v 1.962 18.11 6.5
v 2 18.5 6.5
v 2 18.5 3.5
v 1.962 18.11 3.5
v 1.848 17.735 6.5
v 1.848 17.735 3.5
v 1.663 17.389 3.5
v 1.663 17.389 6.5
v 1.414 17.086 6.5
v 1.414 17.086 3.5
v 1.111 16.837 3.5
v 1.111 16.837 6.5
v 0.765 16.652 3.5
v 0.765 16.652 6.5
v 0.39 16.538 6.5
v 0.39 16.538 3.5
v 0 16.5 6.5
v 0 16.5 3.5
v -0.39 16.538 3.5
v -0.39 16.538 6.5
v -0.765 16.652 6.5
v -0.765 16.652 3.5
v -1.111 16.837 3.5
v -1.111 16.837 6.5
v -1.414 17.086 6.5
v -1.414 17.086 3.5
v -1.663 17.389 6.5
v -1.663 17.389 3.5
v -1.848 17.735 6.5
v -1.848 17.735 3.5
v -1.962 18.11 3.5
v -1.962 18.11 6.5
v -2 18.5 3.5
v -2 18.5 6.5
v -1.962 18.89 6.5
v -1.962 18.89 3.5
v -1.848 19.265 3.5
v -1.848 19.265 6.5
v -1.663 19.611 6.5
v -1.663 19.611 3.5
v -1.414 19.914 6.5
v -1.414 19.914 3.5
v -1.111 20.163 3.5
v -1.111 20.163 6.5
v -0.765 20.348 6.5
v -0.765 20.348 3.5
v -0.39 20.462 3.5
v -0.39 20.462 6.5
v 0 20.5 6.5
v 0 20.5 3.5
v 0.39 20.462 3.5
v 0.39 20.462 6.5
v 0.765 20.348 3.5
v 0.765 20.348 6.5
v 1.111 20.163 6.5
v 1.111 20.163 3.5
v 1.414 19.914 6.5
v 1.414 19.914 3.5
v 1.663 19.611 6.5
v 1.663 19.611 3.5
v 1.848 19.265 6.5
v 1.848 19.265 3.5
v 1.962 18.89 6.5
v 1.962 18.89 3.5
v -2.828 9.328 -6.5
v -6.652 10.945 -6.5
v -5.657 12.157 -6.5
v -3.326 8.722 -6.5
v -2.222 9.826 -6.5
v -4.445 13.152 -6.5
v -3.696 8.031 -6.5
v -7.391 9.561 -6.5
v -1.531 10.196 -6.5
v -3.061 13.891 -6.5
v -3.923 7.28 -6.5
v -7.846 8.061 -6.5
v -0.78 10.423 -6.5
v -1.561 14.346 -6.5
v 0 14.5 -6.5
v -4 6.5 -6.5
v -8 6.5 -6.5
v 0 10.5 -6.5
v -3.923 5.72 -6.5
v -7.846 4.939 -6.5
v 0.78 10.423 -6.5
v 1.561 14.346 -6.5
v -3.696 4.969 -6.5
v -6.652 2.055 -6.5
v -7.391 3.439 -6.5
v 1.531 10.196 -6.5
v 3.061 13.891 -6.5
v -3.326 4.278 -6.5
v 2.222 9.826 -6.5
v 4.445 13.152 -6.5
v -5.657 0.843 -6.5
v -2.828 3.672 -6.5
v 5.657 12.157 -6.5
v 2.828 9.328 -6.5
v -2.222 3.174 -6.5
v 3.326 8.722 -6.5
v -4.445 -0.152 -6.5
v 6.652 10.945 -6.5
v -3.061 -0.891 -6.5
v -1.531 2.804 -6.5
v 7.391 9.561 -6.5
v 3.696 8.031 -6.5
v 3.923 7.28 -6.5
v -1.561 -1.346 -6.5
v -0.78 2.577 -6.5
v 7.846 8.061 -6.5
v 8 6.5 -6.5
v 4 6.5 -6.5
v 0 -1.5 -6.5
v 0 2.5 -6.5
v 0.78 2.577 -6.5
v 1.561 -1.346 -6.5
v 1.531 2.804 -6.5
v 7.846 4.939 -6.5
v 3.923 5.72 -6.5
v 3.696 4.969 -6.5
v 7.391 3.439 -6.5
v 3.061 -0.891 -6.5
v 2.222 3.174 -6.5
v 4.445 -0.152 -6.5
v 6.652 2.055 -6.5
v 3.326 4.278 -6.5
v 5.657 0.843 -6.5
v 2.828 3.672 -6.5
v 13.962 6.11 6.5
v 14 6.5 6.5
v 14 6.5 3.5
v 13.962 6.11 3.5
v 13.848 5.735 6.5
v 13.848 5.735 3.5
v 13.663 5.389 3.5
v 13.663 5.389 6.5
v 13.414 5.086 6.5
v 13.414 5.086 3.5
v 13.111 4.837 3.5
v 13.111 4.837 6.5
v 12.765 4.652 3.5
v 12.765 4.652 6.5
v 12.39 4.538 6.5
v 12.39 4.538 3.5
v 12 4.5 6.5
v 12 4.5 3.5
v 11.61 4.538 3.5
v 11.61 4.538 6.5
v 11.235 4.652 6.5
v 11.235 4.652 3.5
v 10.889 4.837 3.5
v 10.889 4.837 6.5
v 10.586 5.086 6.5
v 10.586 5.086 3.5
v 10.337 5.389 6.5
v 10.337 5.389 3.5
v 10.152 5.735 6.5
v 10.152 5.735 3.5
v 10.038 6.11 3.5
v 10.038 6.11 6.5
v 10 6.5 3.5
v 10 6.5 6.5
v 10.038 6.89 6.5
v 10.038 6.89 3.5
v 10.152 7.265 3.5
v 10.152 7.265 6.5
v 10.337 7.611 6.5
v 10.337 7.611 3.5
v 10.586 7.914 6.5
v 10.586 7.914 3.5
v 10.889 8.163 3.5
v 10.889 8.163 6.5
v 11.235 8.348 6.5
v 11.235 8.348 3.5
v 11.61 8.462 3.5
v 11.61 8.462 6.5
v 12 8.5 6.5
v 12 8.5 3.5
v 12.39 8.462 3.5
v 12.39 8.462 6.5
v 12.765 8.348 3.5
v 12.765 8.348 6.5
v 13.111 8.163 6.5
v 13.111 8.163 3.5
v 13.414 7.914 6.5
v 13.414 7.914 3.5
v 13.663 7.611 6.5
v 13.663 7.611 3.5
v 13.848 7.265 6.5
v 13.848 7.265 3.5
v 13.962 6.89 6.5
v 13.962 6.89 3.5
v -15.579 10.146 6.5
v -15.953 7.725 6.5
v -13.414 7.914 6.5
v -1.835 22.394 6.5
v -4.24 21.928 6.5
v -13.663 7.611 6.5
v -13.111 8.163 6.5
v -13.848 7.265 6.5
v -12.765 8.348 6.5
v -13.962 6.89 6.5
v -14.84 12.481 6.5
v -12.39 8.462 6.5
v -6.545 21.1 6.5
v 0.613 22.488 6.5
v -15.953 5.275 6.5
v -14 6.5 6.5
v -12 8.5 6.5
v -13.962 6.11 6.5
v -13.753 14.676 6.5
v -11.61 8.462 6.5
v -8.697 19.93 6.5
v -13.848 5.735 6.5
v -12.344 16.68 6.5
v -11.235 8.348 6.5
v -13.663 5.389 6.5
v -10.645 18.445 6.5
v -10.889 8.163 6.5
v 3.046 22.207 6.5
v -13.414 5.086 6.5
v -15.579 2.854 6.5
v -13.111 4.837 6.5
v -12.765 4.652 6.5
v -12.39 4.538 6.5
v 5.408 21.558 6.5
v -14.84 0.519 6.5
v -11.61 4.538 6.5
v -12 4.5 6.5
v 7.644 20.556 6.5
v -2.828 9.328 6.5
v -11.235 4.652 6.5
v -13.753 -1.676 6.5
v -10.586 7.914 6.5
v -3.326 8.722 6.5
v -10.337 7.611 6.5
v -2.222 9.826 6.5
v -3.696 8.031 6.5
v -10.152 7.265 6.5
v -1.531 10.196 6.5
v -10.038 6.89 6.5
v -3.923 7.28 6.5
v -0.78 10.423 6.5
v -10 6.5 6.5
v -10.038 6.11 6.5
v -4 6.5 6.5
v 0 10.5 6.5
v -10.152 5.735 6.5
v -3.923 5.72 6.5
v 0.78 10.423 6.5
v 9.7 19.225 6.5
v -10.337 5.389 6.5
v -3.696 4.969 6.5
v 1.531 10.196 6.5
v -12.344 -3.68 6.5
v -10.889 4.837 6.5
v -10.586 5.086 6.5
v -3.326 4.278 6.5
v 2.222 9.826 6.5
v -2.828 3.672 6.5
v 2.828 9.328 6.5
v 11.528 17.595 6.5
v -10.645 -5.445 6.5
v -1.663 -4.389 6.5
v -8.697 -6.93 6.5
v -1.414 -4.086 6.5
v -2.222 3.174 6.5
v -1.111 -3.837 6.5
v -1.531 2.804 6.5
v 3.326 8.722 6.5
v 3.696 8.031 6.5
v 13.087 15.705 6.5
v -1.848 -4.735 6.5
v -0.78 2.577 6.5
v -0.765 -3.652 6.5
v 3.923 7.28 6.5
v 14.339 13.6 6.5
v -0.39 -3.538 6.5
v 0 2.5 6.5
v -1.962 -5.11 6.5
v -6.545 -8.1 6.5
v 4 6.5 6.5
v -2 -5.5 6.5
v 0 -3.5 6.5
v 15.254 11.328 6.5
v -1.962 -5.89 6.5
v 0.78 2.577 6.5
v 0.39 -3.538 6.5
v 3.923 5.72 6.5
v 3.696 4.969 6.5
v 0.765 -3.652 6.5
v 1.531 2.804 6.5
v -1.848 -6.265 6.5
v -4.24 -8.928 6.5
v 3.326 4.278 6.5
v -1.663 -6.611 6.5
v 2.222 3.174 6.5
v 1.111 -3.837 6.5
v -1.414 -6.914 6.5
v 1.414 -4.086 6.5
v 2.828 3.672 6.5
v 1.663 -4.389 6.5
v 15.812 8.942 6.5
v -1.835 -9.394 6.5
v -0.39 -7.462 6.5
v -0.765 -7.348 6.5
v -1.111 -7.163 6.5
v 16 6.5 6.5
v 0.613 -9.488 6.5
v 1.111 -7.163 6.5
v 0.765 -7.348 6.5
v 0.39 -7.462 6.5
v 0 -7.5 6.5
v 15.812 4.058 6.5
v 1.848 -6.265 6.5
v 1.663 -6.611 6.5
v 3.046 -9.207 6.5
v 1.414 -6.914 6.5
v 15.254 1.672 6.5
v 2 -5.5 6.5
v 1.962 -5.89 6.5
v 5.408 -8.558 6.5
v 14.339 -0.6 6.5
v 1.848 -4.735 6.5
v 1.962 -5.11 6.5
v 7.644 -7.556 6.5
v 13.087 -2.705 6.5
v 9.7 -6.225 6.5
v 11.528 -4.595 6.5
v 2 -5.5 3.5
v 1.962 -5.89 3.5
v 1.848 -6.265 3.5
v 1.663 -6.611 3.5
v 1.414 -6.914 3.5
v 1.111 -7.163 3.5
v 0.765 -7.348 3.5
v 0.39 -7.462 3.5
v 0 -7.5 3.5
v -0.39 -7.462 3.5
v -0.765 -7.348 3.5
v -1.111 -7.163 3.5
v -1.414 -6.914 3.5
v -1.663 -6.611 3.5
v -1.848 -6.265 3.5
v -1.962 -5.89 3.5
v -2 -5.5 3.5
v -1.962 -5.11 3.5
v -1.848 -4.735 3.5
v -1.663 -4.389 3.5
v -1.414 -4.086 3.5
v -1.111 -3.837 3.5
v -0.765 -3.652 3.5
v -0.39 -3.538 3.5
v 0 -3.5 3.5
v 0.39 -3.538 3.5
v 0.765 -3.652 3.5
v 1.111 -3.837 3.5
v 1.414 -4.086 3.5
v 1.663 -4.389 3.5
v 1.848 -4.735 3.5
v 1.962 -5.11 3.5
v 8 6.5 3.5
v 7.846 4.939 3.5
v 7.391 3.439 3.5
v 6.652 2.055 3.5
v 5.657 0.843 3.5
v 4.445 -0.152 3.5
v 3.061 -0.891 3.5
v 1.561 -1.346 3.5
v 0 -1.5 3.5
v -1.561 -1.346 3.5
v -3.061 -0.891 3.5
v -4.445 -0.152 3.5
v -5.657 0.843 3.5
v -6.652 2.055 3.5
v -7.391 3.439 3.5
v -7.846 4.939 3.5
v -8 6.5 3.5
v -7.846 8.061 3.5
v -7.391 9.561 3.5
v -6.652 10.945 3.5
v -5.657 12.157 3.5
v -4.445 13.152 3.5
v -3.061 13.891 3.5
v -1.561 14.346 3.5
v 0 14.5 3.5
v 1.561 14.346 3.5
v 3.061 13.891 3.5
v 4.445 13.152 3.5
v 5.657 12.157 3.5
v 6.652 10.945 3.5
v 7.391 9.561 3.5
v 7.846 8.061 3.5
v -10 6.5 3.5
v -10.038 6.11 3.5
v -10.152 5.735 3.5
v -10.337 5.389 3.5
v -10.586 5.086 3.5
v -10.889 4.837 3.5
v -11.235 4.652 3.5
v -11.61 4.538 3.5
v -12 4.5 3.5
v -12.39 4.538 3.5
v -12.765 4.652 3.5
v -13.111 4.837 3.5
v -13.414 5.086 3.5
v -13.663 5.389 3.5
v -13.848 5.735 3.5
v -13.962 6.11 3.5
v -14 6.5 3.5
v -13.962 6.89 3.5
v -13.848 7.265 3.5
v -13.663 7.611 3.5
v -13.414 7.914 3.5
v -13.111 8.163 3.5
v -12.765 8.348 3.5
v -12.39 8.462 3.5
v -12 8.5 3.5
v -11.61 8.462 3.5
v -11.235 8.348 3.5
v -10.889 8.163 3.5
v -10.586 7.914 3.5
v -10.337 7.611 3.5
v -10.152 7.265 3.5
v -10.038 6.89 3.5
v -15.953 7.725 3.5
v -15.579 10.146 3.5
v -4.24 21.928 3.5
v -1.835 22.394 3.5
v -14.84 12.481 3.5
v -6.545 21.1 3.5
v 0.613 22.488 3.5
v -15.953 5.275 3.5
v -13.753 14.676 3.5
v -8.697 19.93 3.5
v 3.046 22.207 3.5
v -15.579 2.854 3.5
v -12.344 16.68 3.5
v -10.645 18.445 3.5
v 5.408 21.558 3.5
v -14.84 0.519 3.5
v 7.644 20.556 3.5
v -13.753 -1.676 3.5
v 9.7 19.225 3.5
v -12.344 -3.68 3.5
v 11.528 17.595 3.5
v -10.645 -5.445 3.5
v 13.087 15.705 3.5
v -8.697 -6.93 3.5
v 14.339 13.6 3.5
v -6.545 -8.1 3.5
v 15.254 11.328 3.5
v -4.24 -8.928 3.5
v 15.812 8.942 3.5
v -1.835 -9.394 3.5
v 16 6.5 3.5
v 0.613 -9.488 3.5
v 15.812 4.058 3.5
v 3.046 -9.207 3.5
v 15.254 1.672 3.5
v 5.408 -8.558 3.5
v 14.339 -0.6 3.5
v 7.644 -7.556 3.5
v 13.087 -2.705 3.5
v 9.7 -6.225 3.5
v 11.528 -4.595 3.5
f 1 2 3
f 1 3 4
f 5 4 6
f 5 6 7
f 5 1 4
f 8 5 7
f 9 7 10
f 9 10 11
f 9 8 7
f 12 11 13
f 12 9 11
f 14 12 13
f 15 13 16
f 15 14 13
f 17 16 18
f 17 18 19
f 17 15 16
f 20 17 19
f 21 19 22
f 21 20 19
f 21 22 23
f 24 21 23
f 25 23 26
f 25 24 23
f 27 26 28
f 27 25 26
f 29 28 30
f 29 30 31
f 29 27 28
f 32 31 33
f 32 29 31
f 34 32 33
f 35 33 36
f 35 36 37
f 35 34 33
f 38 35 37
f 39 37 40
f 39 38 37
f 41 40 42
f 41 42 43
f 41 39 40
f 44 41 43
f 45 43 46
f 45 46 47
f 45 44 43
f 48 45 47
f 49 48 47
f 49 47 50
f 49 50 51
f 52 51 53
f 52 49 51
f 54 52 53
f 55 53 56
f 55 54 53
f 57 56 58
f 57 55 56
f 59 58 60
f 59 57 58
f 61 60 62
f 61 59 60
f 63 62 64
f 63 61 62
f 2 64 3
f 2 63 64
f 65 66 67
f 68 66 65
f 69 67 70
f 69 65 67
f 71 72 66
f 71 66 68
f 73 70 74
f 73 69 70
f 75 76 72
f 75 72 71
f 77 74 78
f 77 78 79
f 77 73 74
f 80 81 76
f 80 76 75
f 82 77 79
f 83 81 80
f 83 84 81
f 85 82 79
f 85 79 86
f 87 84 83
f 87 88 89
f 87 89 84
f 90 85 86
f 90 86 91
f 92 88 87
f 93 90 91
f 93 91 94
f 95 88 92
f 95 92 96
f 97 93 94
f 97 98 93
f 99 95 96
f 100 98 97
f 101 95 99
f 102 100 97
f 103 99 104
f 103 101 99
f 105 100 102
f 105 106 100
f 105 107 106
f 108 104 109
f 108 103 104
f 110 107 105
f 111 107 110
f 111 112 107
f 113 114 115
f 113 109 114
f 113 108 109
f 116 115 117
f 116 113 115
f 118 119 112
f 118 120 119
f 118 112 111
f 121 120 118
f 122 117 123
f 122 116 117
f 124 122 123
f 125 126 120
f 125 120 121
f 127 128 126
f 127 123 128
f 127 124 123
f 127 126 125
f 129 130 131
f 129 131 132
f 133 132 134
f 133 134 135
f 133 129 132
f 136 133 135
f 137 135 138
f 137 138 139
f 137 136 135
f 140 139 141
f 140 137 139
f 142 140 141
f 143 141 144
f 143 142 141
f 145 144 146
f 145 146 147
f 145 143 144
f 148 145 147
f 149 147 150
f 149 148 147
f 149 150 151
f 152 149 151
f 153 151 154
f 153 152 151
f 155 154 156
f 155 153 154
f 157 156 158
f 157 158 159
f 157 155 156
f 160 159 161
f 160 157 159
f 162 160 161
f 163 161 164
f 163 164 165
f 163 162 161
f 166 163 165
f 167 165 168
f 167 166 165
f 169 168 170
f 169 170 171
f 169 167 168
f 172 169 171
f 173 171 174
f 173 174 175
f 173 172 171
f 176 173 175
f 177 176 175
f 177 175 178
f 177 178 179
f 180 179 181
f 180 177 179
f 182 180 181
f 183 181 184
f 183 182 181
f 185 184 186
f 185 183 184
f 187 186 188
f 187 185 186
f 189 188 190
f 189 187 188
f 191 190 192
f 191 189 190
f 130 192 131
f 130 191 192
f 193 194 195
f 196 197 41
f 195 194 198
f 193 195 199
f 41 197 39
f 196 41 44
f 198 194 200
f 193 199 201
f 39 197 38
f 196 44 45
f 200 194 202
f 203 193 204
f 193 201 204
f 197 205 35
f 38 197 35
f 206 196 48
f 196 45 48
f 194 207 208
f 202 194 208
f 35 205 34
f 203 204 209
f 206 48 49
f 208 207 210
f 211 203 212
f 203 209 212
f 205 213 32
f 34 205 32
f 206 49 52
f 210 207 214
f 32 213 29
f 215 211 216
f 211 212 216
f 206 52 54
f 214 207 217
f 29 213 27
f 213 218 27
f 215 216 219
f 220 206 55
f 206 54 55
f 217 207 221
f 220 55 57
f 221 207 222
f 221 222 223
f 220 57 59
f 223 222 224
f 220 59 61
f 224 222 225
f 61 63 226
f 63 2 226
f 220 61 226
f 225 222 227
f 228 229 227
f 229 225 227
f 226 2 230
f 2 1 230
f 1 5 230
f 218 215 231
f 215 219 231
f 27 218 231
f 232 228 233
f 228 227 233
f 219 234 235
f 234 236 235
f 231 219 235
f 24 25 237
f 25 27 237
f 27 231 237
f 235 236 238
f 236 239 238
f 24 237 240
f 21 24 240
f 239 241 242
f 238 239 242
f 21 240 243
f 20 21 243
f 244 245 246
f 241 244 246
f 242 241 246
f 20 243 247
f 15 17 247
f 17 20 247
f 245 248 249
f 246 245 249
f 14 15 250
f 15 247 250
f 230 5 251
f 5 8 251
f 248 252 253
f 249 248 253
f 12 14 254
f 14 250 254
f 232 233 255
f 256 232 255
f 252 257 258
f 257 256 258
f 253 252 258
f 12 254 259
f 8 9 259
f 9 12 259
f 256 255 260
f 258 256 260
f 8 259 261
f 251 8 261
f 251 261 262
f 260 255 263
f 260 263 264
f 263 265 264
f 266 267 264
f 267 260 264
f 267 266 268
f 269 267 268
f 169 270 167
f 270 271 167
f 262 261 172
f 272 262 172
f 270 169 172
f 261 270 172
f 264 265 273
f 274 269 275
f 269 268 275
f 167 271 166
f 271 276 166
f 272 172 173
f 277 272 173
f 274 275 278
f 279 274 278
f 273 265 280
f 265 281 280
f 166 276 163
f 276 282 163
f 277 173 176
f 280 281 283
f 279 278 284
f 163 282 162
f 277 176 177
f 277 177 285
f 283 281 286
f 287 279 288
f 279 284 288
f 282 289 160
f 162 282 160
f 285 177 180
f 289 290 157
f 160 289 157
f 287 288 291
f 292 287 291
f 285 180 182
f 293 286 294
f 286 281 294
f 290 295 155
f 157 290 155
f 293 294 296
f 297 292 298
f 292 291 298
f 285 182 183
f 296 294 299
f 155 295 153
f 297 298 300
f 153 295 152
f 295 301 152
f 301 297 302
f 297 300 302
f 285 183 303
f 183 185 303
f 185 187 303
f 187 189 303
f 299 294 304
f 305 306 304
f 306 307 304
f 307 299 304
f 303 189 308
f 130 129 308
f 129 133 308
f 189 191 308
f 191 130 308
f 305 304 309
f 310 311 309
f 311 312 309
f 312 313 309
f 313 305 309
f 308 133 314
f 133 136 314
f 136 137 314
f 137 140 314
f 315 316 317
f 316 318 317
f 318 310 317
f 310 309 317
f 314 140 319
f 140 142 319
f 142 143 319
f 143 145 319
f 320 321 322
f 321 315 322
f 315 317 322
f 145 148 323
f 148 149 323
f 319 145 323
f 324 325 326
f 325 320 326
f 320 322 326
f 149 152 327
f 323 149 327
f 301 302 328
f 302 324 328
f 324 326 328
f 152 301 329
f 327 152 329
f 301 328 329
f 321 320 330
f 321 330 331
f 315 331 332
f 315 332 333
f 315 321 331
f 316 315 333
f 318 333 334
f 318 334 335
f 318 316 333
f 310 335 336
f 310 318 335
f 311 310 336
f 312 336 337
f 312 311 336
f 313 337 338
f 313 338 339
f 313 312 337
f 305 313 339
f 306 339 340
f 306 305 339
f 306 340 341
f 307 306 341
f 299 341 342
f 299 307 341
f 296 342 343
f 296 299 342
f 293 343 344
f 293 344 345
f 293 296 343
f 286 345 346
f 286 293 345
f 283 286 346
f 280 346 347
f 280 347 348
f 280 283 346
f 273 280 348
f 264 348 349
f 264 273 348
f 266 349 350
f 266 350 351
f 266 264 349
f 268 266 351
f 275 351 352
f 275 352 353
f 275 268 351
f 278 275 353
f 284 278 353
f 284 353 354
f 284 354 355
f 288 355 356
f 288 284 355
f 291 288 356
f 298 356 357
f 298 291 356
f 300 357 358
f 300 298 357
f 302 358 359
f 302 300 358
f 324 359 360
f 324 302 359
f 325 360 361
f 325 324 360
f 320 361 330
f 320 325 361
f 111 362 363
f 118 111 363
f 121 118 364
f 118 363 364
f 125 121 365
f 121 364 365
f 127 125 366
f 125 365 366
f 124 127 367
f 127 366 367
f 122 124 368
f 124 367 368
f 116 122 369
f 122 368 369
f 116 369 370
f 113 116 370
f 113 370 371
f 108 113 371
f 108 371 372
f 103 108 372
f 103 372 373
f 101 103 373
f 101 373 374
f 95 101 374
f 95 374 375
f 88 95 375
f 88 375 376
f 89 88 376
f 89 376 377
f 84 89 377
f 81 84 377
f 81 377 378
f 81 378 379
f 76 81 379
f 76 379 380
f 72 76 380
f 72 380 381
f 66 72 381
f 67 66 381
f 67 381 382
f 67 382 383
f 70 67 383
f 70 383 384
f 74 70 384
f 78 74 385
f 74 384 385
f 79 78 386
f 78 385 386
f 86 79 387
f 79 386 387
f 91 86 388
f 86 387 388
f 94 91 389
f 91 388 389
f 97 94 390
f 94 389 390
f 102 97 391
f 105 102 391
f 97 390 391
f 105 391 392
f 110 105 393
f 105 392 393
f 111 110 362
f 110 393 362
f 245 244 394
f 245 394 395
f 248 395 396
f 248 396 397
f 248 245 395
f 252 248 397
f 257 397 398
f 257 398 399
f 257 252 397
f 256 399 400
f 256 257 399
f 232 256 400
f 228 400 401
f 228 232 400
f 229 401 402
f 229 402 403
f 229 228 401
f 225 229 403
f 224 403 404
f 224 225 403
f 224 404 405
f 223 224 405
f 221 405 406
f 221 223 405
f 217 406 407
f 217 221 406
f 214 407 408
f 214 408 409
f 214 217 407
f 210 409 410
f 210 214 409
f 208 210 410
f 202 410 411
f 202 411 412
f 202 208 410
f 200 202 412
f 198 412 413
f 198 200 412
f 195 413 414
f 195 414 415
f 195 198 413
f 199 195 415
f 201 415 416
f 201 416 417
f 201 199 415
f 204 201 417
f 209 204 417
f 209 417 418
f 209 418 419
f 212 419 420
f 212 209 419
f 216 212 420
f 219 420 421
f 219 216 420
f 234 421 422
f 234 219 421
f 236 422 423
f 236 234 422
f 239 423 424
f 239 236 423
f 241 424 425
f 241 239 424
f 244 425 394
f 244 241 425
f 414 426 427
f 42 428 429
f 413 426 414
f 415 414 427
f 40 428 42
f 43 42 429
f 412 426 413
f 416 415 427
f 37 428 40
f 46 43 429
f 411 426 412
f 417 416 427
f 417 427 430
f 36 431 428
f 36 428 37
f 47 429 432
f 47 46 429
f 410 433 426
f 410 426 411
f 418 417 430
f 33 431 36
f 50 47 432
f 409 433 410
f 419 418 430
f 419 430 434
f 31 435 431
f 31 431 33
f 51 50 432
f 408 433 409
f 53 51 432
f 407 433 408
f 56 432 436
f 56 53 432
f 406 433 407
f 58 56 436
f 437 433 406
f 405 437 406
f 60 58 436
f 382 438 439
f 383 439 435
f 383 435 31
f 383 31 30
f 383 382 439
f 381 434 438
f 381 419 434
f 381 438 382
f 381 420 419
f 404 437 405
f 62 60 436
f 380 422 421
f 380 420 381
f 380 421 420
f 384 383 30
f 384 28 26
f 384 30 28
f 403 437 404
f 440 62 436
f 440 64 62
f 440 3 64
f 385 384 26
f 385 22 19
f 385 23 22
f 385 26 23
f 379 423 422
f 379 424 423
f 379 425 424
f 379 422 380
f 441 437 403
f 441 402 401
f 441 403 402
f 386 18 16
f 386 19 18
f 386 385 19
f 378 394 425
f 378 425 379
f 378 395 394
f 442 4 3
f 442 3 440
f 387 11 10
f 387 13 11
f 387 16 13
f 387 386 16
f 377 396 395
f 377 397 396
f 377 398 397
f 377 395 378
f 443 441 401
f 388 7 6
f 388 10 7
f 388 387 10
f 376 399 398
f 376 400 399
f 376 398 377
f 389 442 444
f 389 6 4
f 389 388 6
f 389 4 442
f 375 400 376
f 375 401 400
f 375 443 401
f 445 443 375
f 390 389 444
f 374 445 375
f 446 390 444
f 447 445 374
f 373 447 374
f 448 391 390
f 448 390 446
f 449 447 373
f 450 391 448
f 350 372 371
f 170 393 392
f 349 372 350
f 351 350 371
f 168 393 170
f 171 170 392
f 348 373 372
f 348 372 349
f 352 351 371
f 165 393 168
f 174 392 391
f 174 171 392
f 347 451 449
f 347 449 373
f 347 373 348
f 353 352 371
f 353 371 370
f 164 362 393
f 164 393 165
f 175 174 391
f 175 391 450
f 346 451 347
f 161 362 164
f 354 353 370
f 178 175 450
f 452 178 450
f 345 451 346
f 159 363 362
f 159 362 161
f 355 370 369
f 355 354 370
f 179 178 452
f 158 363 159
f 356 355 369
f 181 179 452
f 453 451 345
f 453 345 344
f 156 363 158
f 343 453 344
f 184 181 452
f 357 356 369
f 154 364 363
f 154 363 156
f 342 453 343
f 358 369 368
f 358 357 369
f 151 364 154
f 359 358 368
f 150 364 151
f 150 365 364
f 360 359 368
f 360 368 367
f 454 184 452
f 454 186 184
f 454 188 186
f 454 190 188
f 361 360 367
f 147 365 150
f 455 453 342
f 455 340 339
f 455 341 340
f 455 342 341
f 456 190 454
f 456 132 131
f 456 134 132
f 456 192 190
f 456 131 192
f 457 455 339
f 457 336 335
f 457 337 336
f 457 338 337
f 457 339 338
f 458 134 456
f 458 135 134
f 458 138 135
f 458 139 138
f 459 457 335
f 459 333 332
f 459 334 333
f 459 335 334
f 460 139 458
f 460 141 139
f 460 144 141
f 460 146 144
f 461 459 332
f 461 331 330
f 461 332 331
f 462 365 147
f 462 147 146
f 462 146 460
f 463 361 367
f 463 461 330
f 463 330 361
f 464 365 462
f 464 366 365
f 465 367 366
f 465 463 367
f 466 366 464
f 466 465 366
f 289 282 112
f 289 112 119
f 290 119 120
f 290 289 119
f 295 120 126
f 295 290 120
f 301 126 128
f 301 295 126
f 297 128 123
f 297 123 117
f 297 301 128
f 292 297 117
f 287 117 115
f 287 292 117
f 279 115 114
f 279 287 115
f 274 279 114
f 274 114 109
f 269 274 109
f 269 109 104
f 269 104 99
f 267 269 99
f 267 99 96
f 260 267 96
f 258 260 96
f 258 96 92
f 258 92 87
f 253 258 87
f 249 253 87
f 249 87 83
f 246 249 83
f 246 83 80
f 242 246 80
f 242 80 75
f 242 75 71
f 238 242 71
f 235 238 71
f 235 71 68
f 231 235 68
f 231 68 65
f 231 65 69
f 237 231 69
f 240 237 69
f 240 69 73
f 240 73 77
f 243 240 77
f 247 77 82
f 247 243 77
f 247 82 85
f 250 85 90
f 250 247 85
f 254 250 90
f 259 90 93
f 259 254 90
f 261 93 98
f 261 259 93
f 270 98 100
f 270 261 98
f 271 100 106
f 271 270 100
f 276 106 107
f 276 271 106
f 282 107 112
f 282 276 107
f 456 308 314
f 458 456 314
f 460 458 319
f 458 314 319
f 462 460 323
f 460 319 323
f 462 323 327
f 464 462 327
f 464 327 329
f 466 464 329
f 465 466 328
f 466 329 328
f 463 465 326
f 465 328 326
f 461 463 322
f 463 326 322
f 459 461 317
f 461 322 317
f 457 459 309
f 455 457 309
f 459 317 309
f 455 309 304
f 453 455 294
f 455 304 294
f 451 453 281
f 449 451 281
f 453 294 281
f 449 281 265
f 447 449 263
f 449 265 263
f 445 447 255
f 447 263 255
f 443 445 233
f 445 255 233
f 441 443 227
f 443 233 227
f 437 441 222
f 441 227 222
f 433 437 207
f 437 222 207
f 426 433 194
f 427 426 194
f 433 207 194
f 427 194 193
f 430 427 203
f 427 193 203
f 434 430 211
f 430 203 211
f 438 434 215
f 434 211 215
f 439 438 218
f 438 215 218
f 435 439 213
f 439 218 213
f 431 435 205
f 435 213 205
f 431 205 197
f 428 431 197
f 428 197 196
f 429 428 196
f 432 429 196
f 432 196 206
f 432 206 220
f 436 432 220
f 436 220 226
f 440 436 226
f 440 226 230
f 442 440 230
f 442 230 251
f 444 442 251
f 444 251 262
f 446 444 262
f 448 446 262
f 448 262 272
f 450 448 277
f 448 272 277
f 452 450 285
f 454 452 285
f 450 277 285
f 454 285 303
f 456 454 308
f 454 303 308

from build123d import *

# Parameters (mm, degrees)
SKETCH1_R             = 16
SKETCH1_R_2           = 4
SKETCH1_R_3           = 2
BOSS_EXTRUDE1_DEPTH   = 3
SKETCH2_R             = 8
SKETCH2_R_2           = 4
BOSS_EXTRUDE2_DEPTH   = 13
BODY_MOVE_COPY1_ANGLE = 90


with BuildPart() as part:
    # Sketch1 → Boss-Extrude1 (new body)
    with BuildSketch(Plane(origin=(0, 0, 0), x_dir=(1, 0, 0), z_dir=(0, 1, 0))):
        Circle(SKETCH1_R)
        Circle(SKETCH1_R_2, mode=Mode.SUBTRACT)
        with Locations((12, 0)):
            Circle(SKETCH1_R_3, mode=Mode.SUBTRACT)
        with Locations((0, -12)):
            Circle(SKETCH1_R_3, mode=Mode.SUBTRACT)
        with Locations((-12, 0)):
            Circle(SKETCH1_R_3, mode=Mode.SUBTRACT)
        with Locations((0, 12)):
            Circle(SKETCH1_R_3, mode=Mode.SUBTRACT)
    extrude(amount=BOSS_EXTRUDE1_DEPTH)

    # Sketch2 → Boss-Extrude2 (add)
    with BuildSketch(Plane(origin=(0, 0, 0), x_dir=(1, 0, 0), z_dir=(0, 1, 0))):
        Circle(SKETCH2_R)
        Circle(SKETCH2_R_2, mode=Mode.SUBTRACT)
    extrude(amount=BOSS_EXTRUDE2_DEPTH)


with BuildPart() as part_1:
    # Body-Move/Copy1: moved
    add(part.part.rotate(Axis((0, 6.5, 0), (-1, 0, 0)), BODY_MOVE_COPY1_ANGLE))


solid = part_1.part
